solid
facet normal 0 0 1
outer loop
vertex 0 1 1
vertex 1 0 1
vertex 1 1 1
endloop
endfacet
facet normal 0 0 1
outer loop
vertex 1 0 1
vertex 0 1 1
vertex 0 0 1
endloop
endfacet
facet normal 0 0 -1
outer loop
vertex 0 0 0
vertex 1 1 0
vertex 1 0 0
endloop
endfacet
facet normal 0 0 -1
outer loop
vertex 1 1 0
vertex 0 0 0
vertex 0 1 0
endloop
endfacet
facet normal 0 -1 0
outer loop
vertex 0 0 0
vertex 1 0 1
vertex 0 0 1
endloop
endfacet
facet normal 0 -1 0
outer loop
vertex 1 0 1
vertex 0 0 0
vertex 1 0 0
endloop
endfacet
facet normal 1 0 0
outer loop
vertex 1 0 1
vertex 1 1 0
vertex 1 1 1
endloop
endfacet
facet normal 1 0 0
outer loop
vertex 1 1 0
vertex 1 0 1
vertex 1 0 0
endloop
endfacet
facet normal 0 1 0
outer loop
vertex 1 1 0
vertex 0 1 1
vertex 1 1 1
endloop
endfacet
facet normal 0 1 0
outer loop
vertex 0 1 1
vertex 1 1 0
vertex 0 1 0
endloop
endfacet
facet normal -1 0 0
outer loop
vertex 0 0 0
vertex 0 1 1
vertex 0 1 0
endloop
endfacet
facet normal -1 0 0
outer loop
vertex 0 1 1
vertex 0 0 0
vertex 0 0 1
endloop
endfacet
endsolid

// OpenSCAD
even_numbers = [for (i=[0:1:10]) if (i % 2 == 0) i];
filtered_values = [for (j=[1:10]) if (j > 5) j * 2];
squares = [for (x=[1:5]) if (x > 2) x * x];
cube(1);
